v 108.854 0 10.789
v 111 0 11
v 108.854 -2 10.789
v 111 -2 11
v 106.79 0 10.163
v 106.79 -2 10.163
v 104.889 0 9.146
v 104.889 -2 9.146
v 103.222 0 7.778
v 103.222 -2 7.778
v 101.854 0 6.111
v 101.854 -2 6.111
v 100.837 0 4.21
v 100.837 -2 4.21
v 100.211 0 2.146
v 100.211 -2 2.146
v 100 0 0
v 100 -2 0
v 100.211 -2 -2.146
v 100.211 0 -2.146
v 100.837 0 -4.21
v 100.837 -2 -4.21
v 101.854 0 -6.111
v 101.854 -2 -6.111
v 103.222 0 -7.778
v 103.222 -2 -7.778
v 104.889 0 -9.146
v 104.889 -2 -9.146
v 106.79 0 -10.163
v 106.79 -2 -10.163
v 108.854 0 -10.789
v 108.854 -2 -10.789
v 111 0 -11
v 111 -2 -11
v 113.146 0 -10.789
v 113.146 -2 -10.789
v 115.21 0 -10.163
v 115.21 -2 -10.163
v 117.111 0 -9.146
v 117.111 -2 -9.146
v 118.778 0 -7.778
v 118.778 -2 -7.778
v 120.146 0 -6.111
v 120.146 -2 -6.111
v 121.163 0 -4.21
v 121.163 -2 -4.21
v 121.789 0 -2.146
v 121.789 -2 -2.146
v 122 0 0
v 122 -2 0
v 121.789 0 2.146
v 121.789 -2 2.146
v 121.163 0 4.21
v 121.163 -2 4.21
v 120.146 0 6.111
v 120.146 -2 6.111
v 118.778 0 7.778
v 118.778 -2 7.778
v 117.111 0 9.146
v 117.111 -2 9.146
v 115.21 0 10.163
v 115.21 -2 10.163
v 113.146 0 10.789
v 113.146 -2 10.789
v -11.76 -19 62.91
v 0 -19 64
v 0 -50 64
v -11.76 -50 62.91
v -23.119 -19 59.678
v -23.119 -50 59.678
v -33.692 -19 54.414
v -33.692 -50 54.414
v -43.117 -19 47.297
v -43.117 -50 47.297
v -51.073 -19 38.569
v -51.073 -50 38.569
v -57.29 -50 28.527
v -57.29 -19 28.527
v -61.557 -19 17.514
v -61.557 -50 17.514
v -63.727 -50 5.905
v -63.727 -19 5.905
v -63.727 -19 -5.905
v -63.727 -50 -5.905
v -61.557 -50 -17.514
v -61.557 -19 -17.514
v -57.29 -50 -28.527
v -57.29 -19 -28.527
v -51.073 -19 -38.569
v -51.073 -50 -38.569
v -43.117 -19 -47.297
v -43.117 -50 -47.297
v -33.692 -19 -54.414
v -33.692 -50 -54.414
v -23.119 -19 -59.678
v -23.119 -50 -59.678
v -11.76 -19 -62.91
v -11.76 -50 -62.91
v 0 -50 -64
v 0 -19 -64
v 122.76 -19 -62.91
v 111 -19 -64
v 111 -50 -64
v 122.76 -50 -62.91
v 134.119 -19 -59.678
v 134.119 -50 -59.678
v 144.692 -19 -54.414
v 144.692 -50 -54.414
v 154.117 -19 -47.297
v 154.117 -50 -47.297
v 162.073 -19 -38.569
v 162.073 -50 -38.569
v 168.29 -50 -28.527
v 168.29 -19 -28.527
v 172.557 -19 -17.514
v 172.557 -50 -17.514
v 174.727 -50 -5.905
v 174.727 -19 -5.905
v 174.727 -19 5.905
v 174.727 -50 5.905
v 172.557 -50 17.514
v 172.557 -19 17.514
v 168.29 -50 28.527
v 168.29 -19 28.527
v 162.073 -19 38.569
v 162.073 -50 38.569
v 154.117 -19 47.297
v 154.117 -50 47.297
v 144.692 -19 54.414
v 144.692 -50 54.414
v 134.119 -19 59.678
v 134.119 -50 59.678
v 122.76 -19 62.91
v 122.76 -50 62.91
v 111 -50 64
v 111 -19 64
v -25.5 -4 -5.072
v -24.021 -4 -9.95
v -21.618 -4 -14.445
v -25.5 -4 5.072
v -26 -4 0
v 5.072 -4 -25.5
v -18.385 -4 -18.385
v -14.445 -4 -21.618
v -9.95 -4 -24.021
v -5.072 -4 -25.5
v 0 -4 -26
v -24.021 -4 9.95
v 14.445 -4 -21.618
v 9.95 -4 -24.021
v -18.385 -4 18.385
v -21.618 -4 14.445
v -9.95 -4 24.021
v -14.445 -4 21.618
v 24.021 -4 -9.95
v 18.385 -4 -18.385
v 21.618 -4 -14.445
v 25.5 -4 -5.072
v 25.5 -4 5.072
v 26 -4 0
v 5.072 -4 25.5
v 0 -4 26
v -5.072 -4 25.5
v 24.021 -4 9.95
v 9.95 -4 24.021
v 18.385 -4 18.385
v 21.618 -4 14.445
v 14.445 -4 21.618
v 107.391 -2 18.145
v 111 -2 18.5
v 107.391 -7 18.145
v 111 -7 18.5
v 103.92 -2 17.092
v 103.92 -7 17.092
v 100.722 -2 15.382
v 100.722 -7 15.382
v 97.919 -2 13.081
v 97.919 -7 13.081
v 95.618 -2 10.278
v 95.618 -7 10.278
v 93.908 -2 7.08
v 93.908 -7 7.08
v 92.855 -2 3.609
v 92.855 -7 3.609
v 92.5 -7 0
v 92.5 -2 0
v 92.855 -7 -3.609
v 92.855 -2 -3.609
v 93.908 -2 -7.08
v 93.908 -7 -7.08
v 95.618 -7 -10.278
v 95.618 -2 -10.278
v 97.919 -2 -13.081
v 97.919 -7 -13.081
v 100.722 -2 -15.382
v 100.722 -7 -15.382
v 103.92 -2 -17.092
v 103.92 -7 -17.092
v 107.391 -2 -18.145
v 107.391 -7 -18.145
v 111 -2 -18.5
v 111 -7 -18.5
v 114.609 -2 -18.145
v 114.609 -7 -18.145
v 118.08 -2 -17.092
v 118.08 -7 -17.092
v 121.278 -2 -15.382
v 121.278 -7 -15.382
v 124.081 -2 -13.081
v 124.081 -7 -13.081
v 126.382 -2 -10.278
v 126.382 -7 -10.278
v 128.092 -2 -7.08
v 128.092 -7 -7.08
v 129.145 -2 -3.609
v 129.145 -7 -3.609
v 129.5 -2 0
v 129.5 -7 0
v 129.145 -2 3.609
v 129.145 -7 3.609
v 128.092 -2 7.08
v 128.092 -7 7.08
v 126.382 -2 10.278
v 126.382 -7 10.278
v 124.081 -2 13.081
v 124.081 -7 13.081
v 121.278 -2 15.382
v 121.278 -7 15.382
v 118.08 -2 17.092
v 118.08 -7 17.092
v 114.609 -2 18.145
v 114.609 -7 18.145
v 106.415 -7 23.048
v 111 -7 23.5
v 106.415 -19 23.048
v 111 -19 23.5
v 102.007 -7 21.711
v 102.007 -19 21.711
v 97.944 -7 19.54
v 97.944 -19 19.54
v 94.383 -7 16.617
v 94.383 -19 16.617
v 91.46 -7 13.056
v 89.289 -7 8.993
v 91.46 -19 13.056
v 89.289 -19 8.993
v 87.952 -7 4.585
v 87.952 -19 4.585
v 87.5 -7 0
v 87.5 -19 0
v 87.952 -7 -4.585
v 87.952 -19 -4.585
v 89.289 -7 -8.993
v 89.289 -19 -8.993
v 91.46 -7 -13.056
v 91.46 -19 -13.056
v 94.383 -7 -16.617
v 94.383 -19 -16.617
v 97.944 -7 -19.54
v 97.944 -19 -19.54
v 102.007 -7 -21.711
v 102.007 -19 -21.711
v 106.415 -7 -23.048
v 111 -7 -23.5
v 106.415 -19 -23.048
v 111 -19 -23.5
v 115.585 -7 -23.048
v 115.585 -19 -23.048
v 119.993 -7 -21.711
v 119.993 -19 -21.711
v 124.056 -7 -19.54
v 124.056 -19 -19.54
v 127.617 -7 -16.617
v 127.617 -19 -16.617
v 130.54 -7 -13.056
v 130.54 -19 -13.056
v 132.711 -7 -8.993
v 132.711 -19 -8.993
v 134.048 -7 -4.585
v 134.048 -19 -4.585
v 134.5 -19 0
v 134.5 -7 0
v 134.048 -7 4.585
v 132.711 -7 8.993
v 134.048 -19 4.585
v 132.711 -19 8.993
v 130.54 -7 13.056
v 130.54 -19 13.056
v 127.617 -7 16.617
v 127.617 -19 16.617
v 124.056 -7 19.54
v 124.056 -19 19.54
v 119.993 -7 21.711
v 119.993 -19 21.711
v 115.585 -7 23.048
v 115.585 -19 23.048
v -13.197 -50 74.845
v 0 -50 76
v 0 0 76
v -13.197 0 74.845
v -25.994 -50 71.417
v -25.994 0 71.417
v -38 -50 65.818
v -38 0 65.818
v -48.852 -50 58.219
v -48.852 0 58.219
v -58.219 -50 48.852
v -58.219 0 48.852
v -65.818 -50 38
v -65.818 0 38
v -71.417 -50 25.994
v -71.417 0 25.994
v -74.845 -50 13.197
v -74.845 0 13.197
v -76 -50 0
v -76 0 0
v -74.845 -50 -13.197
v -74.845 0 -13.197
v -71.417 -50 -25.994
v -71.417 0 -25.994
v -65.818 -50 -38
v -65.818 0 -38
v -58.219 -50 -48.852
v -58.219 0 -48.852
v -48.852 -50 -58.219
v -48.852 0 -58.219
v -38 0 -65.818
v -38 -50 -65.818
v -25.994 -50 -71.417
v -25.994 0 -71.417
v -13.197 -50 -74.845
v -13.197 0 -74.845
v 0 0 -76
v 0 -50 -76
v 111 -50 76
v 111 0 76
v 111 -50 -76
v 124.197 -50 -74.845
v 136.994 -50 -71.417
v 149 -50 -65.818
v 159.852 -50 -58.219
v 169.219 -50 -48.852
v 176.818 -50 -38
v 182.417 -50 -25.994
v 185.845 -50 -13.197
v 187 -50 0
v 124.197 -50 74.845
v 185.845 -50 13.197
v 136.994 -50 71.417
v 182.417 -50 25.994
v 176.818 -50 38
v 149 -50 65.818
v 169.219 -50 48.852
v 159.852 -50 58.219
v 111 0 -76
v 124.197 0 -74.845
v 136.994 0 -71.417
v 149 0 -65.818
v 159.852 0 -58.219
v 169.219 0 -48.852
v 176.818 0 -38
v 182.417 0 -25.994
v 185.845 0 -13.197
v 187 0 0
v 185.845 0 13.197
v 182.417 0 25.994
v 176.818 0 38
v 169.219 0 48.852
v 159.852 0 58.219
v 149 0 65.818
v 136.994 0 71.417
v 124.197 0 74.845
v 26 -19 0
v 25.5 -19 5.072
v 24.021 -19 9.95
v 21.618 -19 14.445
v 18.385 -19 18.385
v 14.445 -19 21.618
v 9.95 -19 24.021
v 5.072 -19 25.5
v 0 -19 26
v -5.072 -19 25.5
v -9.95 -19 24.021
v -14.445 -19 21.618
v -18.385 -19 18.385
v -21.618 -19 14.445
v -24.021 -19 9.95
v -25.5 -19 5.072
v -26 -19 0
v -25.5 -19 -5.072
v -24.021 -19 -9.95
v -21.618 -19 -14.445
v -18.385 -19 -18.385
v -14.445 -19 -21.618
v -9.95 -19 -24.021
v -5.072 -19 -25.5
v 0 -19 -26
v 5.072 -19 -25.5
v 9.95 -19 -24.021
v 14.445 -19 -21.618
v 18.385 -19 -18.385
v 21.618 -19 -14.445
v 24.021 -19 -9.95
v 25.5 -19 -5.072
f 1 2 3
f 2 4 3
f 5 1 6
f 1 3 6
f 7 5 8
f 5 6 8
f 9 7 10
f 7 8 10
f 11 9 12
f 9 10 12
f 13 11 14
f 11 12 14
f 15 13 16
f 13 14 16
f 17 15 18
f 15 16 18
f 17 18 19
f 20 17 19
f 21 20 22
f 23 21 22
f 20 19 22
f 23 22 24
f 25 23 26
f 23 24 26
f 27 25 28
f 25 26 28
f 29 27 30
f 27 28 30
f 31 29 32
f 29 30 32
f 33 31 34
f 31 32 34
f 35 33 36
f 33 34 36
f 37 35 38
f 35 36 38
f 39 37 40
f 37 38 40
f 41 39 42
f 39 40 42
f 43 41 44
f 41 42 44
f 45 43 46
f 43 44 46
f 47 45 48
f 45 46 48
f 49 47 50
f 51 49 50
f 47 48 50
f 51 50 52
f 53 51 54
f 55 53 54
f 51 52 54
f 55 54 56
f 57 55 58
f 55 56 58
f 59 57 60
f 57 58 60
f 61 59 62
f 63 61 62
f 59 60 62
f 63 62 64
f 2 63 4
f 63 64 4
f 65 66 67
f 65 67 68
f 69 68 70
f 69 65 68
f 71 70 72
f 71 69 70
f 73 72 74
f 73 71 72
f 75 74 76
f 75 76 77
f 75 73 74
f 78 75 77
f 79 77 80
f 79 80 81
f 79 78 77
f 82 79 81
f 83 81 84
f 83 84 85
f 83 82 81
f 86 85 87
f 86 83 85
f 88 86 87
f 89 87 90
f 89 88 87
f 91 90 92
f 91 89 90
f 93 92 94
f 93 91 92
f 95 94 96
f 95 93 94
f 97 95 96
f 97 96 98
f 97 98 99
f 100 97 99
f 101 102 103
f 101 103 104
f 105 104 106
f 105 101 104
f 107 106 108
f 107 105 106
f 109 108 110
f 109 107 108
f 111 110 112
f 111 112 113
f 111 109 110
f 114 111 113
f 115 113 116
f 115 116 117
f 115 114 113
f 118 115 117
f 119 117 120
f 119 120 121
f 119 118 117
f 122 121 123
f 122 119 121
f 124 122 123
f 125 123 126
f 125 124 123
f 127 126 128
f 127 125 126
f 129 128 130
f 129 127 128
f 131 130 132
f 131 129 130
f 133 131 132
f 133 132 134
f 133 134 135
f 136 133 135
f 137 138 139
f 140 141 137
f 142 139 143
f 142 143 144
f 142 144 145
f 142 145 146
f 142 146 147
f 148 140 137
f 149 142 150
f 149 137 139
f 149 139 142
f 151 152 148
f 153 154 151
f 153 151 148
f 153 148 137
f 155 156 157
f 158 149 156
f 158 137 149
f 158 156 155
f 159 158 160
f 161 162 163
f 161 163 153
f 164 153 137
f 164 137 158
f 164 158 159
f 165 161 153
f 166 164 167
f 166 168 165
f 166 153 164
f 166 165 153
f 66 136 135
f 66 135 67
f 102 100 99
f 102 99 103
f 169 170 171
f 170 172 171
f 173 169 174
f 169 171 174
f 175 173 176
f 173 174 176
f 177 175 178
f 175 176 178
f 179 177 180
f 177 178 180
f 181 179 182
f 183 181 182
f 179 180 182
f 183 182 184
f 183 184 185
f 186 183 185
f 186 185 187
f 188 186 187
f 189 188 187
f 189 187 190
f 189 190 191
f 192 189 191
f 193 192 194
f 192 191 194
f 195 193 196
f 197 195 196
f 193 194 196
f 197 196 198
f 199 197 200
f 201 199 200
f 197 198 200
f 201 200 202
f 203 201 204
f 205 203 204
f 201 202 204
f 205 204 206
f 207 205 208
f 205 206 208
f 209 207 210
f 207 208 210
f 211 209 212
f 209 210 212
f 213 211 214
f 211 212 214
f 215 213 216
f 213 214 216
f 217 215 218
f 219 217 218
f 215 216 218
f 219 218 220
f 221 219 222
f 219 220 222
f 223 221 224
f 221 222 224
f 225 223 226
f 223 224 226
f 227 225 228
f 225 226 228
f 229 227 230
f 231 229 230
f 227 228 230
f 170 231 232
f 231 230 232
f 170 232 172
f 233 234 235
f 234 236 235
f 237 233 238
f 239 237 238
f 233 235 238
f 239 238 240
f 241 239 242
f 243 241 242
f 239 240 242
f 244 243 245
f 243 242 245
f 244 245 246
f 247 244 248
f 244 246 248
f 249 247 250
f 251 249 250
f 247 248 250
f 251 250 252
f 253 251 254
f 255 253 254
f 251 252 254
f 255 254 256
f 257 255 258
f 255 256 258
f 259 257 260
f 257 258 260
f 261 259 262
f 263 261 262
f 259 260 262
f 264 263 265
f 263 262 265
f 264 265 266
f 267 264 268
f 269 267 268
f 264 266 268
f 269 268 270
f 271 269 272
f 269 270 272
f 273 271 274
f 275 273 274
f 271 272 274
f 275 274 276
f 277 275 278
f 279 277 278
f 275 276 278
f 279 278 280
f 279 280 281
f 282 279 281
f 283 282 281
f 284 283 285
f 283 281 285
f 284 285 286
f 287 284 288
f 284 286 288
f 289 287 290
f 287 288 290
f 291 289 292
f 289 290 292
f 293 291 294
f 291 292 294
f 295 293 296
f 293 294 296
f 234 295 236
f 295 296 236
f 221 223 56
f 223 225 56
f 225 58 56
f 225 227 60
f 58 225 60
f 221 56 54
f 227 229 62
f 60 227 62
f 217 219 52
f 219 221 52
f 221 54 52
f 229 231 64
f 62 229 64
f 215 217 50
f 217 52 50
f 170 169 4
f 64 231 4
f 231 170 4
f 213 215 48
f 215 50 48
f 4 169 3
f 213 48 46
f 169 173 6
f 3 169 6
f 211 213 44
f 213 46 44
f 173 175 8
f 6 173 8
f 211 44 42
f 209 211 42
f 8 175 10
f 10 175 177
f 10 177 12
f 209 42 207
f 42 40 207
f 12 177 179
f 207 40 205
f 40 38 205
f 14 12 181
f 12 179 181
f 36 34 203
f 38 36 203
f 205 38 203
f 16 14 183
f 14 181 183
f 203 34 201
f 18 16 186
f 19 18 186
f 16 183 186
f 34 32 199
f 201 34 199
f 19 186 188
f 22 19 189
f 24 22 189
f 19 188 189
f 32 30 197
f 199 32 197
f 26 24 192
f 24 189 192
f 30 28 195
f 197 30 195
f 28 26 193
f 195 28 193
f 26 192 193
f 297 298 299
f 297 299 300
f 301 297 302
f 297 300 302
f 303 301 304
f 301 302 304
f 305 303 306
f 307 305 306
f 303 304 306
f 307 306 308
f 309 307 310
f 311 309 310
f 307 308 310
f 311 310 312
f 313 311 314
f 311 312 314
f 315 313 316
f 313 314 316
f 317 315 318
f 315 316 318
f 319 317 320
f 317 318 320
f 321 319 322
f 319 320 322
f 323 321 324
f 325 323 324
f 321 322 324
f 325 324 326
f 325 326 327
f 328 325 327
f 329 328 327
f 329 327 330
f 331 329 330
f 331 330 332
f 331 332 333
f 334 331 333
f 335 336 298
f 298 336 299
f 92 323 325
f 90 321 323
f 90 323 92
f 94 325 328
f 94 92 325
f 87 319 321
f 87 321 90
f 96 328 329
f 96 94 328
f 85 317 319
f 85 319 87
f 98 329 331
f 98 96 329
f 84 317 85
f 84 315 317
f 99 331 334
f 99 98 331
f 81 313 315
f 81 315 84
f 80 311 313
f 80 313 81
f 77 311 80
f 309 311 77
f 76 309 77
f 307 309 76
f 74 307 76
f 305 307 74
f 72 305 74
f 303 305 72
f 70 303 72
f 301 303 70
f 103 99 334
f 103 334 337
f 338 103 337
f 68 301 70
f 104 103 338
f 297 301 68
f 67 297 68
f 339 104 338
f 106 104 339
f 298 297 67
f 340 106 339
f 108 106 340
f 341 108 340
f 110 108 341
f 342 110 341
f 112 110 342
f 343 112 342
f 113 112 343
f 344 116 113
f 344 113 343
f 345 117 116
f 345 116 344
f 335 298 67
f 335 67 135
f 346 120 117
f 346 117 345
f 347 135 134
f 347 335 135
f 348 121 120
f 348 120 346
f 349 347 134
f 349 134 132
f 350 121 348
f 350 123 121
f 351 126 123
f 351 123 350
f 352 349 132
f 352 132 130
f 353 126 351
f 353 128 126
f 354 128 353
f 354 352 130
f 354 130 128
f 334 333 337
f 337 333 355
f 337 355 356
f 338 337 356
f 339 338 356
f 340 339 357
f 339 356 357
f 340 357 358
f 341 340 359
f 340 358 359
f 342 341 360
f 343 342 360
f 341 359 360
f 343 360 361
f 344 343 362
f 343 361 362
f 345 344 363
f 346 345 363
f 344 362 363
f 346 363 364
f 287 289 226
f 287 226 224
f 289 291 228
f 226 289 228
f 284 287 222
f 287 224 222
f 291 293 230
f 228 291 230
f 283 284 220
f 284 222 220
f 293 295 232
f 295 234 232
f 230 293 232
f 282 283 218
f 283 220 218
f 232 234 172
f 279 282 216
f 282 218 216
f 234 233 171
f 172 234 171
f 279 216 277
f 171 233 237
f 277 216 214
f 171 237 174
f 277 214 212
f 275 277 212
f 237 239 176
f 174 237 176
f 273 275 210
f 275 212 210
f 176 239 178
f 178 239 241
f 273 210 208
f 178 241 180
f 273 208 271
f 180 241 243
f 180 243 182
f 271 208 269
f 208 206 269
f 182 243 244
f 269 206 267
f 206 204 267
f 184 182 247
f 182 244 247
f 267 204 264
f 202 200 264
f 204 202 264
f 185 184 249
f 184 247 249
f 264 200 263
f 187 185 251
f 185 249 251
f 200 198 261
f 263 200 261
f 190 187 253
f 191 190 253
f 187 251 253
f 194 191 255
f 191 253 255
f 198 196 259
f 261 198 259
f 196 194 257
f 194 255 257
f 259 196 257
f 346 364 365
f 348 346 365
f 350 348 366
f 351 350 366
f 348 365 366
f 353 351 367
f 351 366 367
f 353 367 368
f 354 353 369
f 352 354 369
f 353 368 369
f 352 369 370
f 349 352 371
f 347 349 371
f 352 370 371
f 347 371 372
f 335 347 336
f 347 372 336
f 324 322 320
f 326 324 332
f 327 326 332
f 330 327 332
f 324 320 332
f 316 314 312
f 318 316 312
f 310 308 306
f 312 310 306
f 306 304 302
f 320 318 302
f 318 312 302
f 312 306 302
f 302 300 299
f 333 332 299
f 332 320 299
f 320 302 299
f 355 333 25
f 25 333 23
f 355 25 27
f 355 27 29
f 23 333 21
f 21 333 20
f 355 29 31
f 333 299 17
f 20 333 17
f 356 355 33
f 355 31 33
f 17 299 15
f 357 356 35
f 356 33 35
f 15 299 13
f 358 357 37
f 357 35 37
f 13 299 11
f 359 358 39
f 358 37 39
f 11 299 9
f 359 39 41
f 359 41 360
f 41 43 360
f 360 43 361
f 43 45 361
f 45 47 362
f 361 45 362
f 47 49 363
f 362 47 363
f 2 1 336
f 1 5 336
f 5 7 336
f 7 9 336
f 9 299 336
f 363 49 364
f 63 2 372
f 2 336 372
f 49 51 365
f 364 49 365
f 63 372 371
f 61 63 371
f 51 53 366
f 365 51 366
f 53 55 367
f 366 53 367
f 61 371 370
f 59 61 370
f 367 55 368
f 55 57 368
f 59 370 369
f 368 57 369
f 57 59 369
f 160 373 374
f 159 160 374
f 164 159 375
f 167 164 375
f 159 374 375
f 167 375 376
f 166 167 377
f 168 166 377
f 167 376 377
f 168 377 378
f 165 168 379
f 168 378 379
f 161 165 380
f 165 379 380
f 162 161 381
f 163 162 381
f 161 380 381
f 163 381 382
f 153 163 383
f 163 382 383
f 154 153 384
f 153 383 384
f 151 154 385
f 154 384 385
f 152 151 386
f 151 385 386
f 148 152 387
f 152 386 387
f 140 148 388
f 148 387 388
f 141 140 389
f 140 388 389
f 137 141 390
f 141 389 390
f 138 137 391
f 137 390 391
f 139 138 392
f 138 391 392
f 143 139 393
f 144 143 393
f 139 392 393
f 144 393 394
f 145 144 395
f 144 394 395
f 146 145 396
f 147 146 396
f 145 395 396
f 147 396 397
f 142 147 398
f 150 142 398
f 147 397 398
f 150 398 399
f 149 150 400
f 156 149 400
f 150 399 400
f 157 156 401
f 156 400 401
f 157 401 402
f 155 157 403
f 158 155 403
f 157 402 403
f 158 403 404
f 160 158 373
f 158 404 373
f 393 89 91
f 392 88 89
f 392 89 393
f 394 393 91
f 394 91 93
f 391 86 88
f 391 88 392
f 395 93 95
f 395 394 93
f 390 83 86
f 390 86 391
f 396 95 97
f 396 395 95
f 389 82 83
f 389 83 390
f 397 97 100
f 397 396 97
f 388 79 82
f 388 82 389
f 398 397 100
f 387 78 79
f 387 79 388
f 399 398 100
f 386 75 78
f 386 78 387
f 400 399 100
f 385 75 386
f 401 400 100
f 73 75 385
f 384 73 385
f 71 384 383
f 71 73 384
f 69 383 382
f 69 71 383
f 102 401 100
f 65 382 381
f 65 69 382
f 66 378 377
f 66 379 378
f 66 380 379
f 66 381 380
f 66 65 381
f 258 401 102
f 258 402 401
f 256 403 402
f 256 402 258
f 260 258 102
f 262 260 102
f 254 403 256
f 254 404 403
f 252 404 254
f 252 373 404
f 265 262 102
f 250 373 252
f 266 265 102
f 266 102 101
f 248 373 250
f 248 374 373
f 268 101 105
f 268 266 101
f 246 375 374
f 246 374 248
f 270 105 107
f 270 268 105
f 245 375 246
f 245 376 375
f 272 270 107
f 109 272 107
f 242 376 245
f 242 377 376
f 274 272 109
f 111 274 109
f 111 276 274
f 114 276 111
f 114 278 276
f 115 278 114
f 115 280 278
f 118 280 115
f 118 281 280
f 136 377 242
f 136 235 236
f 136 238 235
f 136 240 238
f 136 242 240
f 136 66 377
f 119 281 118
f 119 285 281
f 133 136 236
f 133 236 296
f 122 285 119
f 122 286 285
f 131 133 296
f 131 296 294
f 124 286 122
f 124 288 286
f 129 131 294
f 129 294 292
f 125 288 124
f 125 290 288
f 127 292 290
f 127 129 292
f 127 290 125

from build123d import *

# Parameters (mm, degrees)
F1_DEPTH = 50
F4_DEPTH = 31
F5_R     = 26
F6_DEPTH = 15


with BuildPart() as f1:
    # F0 (on Front) → F1 (new body)
    with BuildSketch(Plane.XZ):
        with BuildLine():
            ThreePointArc((55.5, 51.9206124771), (30.2492433933, 69.7207521053), (0, 76))
            ThreePointArc((0, 76), (-76, 0), (0, -76))
            ThreePointArc((0, -76), (30.2492433933, -69.7207521053), (55.5, -51.9206124771))
            ThreePointArc((55.5, -51.9206124771), (35, 0), (55.5, 51.9206124771))
        make_face()
        with BuildLine():
            ThreePointArc((111, 76), (80.7507566067, 69.7207521053), (55.5, 51.9206124771))
            ThreePointArc((55.5, 51.9206124771), (70.6894617323, 27.9105714739), (76, 0))
            ThreePointArc((76, 0), (70.6894617323, -27.9105714739), (55.5, -51.9206124771))
            ThreePointArc((55.5, -51.9206124771), (80.7507566067, -69.7207521053), (111, -76))
            ThreePointArc((111, -76), (164.7401153702, -53.7401153702), (187, 0))
            ThreePointArc((187, 0), (164.7401153702, 53.7401153702), (111, 76))
        make_face()
        with BuildLine():
            ThreePointArc((76, 0), (70.6894617323, 27.9105714739), (55.5, 51.9206124771))
            ThreePointArc((55.5, 51.9206124771), (35, 0), (55.5, -51.9206124771))
            ThreePointArc((55.5, -51.9206124771), (70.6894617323, -27.9105714739), (76, 0))
        make_face()
        with BuildLine():
            Line((111, 76), (0, 76))
            ThreePointArc((0, 76), (30.2492433933, 69.7207521053), (55.5, 51.9206124771))
            ThreePointArc((55.5, 51.9206124771), (80.7507566067, 69.7207521053), (111, 76))
        make_face()
        with BuildLine():
            ThreePointArc((55.5, -51.9206124771), (30.2492433933, -69.7207521053), (0, -76))
            Line((0, -76), (111, -76))
            ThreePointArc((111, -76), (80.7507566067, -69.7207521053), (55.5, -51.9206124771))
        make_face()
    extrude(amount=F1_DEPTH)

    # F3 (on offset) → F4 (cut)
    with BuildSketch(Plane.XZ.offset(19)):
        with BuildLine():
            Line((111, 64), (0, 64))
            ThreePointArc((0, 64), (-64, 0), (0, -64))
            Line((0, -64), (111, -64))
            ThreePointArc((111, -64), (175, 0), (111, 64))
        make_face()
    extrude(amount=F4_DEPTH, mode=Mode.SUBTRACT)

    # F5 (on face) → F6 (cut)
    with BuildSketch(Plane.XZ.offset(19)):
        Circle(F5_R)
    extrude(amount=-F6_DEPTH, mode=Mode.SUBTRACT)

    # F8 (on offset) → F9 (revolve, cut)
    with BuildSketch(Plane.YZ.offset(111)):
        Polygon((-19, 0), (0, 0), (0, 11), (-2, 11), (-2, 18.5), (-7, 18.5), (-7, 23.5), (-19, 23.5), align=None)
    revolve(axis=Axis((111, -31.2652774155, 0), (0, -1, 0)), mode=Mode.SUBTRACT)


solid = f1.part
